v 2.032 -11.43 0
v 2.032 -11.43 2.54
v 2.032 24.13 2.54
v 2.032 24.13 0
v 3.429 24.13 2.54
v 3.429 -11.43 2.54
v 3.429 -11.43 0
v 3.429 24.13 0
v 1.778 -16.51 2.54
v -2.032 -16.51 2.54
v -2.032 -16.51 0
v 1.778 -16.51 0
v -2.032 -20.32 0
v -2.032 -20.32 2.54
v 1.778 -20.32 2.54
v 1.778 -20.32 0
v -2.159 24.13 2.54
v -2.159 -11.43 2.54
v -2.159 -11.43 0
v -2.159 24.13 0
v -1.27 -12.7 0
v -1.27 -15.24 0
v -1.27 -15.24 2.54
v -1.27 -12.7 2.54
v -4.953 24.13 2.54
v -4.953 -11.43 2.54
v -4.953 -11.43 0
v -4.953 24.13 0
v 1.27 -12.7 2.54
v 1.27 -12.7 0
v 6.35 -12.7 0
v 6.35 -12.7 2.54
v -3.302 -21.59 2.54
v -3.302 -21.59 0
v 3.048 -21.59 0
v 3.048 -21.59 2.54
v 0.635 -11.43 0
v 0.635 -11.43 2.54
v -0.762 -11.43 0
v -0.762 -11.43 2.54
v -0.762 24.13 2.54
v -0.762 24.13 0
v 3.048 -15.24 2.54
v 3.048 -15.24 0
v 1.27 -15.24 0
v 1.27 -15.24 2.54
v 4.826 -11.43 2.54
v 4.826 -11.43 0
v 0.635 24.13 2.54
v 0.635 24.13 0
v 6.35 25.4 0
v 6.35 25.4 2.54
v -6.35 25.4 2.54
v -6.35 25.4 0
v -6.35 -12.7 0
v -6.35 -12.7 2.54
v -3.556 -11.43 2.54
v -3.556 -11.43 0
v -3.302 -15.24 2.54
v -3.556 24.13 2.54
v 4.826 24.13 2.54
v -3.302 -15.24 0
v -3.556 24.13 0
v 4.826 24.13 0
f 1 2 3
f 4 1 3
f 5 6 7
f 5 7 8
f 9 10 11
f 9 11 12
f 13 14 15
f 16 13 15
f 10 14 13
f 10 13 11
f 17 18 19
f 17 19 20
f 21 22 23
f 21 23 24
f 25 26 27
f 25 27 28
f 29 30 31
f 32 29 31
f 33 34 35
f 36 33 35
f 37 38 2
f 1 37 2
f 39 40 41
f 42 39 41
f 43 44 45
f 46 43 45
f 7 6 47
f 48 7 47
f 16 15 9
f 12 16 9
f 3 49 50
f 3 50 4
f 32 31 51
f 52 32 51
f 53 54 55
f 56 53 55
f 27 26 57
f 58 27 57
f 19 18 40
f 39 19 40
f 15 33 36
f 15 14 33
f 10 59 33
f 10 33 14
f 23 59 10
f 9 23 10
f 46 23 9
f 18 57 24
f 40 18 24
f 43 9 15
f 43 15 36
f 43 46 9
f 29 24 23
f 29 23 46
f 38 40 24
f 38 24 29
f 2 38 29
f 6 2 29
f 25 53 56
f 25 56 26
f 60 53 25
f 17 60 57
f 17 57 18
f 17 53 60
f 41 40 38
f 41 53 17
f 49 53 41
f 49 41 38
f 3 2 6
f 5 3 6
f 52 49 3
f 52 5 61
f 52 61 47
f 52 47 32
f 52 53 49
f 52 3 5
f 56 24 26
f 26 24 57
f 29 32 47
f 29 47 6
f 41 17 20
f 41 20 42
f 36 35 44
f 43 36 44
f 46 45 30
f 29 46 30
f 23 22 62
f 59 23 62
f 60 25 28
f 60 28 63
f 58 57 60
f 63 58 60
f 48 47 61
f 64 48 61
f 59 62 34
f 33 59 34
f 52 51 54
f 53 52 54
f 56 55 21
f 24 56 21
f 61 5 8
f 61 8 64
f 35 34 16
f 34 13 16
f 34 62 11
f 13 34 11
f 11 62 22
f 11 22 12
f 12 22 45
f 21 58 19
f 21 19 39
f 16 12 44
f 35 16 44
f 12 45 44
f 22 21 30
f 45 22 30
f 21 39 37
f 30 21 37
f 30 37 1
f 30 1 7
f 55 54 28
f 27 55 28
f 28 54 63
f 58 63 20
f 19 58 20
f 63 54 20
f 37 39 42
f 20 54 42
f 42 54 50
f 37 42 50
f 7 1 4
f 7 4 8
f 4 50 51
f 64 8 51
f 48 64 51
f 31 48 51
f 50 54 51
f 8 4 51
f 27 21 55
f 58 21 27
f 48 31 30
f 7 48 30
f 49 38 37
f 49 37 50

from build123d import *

# Parameters (mm, degrees)
F0_W     = 2.54
F0_H     = 2.54
F1_DEPTH = 2.54
F2_W     = 1.397
F2_H     = 35.56
F3_DEPTH = 2.541
F4_W     = 3.81
F4_H     = 3.81
F5_DEPTH = 2.541


with BuildPart() as f1:
    # F0 (on Top) → F1 (new body)
    with BuildSketch(Plane.XY):
        Polygon((6.35, 25.4), (-6.35, 25.4), (-6.35, -12.7), (-1.27, -12.7), (1.27, -12.7), (6.35, -12.7), align=None)
        with Locations((0, -13.97)):
            Rectangle(F0_W, F0_H)
        Polygon((1.27, -15.24), (-1.27, -15.24), (-3.302, -15.24), (-3.302, -21.59), (3.048, -21.59), (3.048, -15.24), align=None)
    extrude(amount=F1_DEPTH)

    # F2 (on face) → F3 (cut, through all)
    with BuildSketch(Plane.XY.offset(2.54)):
        with Locations((-4.2545, 6.35)):
            Rectangle(F2_W, F2_H)
        with Locations((-1.4605, 6.35)):
            Rectangle(F2_W, F2_H)
        with Locations((1.3335, 6.35)):
            Rectangle(F2_W, F2_H)
        with Locations((4.1275, 6.35)):
            Rectangle(F2_W, F2_H)
    extrude(amount=-F3_DEPTH, mode=Mode.SUBTRACT)

    # F4 (on face) → F5 (cut, through all)
    with BuildSketch(Plane.XY.offset(2.54)):
        with Locations((-0.127, -18.415)):
            Rectangle(F4_W, F4_H)
    extrude(amount=-F5_DEPTH, mode=Mode.SUBTRACT)


solid = f1.part
